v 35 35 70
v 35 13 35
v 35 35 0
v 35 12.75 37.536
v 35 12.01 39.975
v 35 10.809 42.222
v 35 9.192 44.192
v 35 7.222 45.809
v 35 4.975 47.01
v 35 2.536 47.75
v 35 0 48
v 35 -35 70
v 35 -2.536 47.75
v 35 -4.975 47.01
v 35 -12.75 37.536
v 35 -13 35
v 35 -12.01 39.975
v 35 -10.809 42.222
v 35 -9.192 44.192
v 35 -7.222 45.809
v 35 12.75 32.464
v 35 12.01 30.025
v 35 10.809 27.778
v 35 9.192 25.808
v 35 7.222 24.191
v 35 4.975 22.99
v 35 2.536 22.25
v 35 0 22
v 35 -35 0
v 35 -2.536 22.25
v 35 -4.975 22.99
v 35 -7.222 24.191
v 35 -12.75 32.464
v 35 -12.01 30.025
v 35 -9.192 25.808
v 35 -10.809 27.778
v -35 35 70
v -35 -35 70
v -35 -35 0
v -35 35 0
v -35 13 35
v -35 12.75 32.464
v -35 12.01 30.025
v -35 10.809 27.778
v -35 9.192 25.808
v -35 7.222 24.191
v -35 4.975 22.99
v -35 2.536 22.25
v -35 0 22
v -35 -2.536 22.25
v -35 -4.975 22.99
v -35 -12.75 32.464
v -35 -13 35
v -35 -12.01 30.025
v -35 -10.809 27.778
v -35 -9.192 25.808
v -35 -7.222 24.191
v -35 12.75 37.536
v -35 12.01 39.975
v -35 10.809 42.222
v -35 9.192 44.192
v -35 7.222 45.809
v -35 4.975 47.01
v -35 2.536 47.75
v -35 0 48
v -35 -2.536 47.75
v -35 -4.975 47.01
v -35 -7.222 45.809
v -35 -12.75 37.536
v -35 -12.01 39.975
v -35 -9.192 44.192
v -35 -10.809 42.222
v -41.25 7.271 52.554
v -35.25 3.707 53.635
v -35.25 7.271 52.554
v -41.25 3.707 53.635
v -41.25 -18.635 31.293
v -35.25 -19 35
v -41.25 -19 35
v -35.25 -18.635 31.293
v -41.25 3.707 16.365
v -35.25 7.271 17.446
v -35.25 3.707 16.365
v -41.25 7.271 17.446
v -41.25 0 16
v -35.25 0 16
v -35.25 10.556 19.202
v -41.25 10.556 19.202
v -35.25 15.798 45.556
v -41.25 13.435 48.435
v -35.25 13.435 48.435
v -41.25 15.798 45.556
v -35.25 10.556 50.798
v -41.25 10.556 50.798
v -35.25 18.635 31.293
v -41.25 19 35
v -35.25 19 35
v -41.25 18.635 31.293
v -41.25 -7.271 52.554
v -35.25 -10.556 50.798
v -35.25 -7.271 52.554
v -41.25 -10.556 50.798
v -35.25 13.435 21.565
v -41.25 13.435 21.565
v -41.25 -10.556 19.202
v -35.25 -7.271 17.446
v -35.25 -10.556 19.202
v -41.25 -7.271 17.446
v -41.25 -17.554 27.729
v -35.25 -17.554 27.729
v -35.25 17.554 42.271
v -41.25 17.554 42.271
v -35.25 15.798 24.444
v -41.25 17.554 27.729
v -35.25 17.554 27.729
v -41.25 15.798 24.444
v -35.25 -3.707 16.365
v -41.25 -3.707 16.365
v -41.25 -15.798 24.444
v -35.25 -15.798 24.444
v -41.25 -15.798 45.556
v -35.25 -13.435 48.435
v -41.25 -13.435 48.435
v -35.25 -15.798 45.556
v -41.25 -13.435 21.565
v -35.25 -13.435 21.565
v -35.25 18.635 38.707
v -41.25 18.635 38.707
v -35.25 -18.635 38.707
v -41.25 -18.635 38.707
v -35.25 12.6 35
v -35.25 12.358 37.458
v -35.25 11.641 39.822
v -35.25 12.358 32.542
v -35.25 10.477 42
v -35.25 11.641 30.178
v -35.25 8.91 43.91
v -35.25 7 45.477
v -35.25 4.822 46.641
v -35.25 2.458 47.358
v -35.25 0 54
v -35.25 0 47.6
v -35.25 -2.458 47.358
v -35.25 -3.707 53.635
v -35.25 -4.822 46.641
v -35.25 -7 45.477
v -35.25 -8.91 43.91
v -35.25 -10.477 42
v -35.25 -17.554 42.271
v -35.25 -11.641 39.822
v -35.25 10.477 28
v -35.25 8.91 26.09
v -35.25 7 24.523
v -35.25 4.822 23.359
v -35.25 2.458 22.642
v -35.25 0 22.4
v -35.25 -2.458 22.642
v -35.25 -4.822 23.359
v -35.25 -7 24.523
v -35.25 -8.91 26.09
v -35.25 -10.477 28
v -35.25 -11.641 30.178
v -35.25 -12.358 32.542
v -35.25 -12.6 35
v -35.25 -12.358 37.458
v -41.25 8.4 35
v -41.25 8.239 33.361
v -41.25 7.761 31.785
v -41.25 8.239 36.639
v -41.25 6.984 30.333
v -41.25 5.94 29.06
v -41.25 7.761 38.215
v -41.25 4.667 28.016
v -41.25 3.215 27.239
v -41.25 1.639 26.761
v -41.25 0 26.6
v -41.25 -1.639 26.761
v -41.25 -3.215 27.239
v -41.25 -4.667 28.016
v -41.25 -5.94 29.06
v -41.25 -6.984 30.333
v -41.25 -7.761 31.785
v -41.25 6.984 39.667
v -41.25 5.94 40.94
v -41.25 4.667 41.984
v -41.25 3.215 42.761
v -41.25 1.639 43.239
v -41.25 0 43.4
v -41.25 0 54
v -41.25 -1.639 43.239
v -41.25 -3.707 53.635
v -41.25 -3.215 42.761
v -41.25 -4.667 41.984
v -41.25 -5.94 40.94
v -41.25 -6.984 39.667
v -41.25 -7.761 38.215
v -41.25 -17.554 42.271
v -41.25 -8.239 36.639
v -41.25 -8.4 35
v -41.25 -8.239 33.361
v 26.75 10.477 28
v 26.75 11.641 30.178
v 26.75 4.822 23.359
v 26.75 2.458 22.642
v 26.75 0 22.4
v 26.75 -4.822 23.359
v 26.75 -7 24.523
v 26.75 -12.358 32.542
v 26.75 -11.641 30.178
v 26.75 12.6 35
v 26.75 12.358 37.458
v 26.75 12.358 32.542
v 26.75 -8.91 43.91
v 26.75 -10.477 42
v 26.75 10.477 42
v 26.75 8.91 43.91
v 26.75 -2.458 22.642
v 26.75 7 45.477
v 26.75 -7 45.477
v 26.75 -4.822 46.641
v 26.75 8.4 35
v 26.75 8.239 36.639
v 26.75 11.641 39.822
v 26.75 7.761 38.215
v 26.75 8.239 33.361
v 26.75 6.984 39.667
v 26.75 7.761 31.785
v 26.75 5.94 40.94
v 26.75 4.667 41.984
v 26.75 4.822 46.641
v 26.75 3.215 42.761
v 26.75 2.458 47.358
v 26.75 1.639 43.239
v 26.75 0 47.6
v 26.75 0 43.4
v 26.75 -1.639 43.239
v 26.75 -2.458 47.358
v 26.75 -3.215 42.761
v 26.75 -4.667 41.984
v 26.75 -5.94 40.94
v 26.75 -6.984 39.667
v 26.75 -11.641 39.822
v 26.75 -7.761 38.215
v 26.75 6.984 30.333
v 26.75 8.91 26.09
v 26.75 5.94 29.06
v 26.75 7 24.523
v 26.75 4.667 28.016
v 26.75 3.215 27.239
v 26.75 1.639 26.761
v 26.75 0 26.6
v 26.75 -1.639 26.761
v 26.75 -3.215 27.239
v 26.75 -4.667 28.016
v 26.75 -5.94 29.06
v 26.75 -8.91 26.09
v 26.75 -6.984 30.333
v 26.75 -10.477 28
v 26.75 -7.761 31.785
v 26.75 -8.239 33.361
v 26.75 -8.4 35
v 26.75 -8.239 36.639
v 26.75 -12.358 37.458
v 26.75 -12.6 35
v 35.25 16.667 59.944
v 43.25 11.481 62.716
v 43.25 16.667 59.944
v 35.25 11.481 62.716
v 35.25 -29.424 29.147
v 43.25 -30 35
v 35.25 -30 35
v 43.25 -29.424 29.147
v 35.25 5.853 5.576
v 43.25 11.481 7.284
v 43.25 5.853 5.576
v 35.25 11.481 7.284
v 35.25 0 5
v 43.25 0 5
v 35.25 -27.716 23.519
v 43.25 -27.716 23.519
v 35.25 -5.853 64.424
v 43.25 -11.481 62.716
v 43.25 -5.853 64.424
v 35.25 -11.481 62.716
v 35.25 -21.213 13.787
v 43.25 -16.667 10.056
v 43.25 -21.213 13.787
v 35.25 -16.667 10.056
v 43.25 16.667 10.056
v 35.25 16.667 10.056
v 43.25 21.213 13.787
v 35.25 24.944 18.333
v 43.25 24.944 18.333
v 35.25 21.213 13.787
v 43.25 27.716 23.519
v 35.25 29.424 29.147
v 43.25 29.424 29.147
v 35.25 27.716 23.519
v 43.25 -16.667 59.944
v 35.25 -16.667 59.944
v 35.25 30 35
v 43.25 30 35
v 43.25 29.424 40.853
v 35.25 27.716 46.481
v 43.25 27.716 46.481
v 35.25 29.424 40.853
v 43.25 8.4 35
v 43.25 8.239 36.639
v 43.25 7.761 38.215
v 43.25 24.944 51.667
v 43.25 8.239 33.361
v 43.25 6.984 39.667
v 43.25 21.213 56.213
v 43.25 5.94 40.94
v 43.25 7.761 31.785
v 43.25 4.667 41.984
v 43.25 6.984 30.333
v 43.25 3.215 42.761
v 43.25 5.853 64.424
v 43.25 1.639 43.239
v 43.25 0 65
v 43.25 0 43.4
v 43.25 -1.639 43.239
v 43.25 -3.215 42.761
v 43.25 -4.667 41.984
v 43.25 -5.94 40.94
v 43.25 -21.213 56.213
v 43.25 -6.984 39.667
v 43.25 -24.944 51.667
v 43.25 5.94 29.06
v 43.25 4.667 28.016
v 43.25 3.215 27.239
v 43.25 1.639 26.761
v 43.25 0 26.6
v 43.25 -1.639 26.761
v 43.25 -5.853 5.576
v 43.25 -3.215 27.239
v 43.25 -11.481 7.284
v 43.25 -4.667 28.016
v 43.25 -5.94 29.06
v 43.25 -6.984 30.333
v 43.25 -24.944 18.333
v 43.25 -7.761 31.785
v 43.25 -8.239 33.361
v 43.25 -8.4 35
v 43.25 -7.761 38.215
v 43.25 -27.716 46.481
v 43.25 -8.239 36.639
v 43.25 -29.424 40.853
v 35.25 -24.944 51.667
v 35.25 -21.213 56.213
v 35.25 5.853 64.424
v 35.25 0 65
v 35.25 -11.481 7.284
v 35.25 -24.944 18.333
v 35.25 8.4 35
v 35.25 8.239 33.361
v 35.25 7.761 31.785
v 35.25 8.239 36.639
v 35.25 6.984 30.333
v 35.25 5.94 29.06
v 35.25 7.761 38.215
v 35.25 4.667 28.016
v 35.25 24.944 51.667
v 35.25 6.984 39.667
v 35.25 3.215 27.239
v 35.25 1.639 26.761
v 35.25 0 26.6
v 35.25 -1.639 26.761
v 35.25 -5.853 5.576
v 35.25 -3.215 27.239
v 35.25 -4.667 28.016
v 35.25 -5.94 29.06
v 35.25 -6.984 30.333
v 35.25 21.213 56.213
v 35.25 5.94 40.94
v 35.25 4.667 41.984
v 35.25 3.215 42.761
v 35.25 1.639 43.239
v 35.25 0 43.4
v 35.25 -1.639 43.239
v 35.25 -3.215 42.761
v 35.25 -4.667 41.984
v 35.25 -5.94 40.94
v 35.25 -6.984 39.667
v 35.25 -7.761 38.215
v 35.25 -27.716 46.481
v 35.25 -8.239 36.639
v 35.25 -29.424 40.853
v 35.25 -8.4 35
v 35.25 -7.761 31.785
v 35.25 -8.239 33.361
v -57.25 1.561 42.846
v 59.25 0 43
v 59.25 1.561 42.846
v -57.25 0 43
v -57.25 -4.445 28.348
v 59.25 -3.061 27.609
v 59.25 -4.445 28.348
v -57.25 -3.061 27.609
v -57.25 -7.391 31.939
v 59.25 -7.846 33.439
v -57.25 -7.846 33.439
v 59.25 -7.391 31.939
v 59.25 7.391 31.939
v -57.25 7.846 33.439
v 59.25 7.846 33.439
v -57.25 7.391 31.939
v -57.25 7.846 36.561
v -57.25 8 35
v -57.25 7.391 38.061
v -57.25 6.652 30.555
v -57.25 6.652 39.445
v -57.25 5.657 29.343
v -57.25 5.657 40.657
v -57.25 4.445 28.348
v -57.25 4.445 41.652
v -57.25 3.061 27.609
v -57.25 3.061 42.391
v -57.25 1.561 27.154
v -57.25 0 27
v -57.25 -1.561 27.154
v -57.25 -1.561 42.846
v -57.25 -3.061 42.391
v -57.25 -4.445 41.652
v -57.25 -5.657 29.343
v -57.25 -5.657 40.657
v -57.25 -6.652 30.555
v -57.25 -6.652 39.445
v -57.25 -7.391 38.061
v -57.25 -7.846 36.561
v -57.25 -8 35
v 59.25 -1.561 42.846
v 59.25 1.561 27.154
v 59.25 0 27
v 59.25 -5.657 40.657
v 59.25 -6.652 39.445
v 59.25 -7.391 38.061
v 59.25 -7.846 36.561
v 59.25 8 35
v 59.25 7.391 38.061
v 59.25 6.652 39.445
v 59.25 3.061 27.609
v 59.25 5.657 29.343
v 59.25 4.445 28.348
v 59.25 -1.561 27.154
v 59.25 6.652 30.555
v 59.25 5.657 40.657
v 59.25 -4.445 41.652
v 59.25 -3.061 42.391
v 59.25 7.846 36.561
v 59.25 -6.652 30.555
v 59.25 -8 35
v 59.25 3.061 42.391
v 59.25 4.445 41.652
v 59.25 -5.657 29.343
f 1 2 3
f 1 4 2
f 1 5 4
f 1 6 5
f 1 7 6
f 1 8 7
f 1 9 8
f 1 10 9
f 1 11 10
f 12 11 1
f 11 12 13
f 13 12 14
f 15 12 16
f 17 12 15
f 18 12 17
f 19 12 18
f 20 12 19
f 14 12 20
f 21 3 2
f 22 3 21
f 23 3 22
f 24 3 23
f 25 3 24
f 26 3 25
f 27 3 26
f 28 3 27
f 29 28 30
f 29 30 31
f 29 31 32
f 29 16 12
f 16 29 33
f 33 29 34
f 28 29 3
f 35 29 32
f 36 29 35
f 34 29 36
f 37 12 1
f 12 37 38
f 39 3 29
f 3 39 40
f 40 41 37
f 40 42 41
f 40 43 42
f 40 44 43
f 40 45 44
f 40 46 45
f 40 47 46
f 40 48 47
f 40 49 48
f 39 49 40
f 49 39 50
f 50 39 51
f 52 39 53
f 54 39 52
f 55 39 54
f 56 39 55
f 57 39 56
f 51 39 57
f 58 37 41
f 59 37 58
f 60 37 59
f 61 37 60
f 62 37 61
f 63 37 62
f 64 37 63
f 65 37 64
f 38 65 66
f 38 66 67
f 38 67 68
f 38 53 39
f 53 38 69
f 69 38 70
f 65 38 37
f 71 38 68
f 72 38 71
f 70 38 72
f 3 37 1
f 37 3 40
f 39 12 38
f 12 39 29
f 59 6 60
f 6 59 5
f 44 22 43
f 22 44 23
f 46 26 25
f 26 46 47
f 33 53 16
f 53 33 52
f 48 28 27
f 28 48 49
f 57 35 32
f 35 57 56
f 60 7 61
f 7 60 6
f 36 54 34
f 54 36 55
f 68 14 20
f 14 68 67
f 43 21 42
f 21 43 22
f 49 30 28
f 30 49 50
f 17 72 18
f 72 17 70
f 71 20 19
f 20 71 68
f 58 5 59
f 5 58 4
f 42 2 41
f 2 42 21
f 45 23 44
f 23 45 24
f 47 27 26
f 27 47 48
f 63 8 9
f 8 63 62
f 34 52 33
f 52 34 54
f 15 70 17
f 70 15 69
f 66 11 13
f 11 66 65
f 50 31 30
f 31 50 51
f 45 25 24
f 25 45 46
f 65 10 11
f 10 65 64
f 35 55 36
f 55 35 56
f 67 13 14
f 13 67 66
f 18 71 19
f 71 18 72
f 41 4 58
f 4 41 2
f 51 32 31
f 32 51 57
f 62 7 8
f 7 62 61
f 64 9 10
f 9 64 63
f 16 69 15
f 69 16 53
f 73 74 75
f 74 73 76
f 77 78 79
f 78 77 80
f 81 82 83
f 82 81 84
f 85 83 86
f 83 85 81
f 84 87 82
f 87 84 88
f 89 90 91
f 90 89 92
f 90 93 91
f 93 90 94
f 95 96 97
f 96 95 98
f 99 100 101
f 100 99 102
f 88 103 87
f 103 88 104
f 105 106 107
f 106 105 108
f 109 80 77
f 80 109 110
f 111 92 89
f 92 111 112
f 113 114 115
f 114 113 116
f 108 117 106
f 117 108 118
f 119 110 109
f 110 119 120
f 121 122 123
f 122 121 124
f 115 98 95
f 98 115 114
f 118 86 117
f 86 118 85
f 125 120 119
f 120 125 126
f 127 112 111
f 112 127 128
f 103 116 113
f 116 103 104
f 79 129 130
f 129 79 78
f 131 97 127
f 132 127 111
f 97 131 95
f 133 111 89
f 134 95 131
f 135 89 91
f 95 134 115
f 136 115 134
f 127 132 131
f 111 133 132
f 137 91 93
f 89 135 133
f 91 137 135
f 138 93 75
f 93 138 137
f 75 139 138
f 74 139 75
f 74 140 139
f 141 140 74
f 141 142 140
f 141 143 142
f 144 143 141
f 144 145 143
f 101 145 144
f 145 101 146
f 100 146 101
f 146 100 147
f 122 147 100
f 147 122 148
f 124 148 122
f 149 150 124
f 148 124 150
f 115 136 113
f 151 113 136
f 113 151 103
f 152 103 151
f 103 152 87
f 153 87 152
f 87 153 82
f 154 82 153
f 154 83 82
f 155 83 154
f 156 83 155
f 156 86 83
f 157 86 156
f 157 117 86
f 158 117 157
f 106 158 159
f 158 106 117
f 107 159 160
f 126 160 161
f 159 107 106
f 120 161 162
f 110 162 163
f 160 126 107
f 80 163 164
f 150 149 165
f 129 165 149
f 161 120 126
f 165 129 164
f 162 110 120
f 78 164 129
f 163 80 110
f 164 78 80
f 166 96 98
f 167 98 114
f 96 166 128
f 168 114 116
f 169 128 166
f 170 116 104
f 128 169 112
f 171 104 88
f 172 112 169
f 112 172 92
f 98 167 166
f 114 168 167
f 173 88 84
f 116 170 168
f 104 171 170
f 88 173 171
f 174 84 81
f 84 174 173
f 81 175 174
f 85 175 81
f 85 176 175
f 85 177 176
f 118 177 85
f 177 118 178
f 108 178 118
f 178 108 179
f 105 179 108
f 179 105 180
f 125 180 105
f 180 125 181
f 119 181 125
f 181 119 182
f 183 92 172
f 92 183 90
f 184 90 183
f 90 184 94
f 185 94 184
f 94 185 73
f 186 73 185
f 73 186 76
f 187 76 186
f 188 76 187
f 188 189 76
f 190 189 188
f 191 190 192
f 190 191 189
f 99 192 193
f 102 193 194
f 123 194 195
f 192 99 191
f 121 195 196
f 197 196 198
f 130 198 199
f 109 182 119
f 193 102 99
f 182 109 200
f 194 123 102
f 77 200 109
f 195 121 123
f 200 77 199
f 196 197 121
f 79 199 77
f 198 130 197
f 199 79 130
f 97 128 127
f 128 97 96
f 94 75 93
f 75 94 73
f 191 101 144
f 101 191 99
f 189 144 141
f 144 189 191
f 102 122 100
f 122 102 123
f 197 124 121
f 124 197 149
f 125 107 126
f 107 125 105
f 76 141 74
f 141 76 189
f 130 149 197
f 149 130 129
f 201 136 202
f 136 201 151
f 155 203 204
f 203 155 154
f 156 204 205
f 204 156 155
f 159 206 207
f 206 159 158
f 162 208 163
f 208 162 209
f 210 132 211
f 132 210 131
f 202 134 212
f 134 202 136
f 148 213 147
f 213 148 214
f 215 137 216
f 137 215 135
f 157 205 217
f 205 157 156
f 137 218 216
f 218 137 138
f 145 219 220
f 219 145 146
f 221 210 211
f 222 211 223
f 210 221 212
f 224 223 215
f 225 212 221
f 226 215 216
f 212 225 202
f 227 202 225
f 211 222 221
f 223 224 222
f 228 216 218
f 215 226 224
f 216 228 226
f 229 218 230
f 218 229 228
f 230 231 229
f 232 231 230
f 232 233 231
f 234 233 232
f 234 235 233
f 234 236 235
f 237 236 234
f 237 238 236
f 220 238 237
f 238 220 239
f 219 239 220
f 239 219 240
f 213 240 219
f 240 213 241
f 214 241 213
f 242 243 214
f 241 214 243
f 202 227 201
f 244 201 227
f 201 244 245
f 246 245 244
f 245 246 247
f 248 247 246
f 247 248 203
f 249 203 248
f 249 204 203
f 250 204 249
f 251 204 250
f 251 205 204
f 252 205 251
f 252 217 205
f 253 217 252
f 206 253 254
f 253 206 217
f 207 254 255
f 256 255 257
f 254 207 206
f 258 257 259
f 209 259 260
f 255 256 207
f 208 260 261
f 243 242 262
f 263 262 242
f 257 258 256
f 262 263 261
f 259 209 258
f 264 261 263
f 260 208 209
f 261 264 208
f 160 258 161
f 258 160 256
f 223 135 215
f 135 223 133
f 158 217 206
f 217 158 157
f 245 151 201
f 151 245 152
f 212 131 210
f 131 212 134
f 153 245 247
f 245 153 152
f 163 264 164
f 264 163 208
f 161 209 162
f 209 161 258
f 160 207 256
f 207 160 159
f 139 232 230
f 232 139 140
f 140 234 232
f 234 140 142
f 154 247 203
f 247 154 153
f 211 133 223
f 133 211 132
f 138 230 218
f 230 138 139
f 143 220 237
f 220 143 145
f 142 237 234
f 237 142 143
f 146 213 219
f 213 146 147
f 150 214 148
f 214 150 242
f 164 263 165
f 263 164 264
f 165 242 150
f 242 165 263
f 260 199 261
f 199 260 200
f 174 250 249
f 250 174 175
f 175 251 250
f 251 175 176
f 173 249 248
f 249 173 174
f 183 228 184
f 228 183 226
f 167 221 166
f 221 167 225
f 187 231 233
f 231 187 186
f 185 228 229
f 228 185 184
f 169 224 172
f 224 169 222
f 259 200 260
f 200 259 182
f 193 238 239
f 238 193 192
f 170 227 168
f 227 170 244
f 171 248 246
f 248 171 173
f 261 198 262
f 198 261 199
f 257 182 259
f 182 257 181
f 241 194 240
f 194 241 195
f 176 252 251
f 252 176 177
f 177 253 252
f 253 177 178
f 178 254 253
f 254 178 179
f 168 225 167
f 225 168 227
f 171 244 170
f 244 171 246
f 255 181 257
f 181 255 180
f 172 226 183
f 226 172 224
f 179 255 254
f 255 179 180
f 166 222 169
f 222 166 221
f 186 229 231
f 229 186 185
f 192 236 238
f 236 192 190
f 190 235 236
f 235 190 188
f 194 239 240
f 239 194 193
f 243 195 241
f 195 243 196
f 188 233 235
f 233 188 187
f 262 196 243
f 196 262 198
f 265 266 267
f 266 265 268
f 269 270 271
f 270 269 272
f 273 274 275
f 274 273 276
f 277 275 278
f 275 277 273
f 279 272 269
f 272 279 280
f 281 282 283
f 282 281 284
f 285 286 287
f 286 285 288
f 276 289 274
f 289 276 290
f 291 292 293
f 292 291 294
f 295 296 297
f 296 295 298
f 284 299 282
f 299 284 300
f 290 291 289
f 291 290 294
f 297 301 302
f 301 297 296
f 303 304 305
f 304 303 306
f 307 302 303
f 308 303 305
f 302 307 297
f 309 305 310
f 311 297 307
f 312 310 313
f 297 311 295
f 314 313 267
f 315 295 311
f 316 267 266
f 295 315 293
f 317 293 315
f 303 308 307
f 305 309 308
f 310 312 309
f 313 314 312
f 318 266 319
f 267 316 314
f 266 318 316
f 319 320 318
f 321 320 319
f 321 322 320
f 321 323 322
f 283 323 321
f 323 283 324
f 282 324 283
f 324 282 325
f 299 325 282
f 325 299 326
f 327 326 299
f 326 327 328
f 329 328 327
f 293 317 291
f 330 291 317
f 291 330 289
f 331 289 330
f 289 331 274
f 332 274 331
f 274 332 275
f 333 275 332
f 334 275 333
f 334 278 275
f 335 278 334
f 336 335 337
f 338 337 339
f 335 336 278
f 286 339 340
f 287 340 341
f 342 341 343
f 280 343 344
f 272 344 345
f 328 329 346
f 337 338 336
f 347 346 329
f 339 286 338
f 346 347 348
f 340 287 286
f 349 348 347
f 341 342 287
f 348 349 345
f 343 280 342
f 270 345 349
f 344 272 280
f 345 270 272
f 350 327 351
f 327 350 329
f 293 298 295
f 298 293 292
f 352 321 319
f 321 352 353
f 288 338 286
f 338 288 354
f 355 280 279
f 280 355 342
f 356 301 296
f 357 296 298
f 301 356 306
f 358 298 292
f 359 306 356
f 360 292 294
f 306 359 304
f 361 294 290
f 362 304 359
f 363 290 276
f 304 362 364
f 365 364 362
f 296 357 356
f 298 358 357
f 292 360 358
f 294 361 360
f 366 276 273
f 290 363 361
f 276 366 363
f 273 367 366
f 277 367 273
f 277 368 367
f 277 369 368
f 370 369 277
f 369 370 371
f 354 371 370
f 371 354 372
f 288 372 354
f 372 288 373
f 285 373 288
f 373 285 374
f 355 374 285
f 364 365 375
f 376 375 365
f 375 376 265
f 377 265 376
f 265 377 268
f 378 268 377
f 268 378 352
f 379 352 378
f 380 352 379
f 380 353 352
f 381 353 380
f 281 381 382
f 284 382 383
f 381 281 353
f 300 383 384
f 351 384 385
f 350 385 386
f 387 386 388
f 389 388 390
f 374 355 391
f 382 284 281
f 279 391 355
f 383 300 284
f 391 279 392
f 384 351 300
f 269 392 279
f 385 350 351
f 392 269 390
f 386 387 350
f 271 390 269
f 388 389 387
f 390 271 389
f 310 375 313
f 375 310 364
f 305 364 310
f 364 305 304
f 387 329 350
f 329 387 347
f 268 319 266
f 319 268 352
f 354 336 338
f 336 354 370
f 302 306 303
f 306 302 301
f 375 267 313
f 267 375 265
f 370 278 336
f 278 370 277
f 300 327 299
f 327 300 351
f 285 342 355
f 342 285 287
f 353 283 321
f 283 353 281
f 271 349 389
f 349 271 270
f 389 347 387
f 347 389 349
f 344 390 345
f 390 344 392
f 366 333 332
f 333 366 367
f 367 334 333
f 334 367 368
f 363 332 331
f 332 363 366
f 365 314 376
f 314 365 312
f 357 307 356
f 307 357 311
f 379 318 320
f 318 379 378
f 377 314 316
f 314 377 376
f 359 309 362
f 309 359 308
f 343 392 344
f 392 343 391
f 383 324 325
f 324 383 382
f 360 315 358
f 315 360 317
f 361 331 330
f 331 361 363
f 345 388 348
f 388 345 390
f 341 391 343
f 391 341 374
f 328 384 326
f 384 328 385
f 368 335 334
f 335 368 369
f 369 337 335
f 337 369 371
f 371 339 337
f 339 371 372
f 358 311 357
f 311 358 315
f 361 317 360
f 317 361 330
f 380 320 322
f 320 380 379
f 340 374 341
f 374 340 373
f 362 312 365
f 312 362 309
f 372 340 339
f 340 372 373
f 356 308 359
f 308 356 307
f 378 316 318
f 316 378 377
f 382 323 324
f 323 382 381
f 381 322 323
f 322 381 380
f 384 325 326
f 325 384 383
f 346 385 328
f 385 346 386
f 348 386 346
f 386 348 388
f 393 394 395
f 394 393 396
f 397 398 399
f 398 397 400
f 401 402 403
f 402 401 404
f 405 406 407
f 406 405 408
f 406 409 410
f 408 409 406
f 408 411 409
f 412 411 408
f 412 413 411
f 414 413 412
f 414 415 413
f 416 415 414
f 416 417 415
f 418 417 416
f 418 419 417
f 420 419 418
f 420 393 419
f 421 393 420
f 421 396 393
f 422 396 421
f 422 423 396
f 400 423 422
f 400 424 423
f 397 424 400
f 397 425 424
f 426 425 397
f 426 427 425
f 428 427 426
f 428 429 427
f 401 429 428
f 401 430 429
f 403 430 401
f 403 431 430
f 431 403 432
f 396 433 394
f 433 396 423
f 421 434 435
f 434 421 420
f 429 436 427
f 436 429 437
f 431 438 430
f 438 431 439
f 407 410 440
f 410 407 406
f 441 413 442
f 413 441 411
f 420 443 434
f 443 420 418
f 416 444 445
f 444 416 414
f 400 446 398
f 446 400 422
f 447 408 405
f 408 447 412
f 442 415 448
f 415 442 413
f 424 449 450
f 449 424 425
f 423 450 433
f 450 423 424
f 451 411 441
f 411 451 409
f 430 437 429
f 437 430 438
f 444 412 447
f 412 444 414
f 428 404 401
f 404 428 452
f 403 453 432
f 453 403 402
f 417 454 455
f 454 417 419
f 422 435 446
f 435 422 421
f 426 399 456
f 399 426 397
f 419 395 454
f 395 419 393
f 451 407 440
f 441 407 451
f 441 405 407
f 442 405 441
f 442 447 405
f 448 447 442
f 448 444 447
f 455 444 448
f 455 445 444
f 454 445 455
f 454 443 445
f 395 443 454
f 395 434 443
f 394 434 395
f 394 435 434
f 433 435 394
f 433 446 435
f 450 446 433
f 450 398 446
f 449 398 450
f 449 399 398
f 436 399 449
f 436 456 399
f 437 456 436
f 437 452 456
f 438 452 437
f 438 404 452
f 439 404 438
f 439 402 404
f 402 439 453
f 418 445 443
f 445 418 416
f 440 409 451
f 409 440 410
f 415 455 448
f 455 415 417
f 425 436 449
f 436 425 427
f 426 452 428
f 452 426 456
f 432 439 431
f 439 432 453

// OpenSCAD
$fn = 32;

// ------------------------------------------------------------------------
// Bushed housing: 70 x 70 x 70 mm housing, bushing d25.2
// Every part is its own module, assembly() places them once.
// ------------------------------------------------------------------------

// --- part 1 ---
module housing() {
  difference() {
    translate([-35, -35, 0]) cube([70, 70, 70]);
    translate([0, 0, 35]) rotate([0, 90, 0]) cylinder(h = 72, d = 26, center = true);
  }
}

// --- part 2 ---
module bushing() {
  difference() {
    union() {
      cylinder(h = 6, d = 38);
      translate([0, 0, 6]) cylinder(h = 62, d = 25.2);
    }
    translate([0, 0, -1]) cylinder(h = 70, d = 16.8);
  }
}

// --- part 3 ---
module shaft() {
  translate([0, 0, -58.25]) cylinder(h = 116.5, d = 16);
}

// --- part 4 ---
module cover() {
  difference() {
    cylinder(h = 8, d = 60);
    translate([0, 0, -1]) cylinder(h = 10, d = 16.8);
  }
}

// --- assembly ---
module assembly() {
  translate([0, 0, 0]) rotate([0, 0, 0]) housing();
  translate([-41.25, 0, 35]) rotate([0, 90, 0]) bushing();
  translate([1, 0, 35]) rotate([0, 90, 0]) shaft();
  translate([35.25, 0, 35]) rotate([0, 90, 0]) cover();
}

assembly();
